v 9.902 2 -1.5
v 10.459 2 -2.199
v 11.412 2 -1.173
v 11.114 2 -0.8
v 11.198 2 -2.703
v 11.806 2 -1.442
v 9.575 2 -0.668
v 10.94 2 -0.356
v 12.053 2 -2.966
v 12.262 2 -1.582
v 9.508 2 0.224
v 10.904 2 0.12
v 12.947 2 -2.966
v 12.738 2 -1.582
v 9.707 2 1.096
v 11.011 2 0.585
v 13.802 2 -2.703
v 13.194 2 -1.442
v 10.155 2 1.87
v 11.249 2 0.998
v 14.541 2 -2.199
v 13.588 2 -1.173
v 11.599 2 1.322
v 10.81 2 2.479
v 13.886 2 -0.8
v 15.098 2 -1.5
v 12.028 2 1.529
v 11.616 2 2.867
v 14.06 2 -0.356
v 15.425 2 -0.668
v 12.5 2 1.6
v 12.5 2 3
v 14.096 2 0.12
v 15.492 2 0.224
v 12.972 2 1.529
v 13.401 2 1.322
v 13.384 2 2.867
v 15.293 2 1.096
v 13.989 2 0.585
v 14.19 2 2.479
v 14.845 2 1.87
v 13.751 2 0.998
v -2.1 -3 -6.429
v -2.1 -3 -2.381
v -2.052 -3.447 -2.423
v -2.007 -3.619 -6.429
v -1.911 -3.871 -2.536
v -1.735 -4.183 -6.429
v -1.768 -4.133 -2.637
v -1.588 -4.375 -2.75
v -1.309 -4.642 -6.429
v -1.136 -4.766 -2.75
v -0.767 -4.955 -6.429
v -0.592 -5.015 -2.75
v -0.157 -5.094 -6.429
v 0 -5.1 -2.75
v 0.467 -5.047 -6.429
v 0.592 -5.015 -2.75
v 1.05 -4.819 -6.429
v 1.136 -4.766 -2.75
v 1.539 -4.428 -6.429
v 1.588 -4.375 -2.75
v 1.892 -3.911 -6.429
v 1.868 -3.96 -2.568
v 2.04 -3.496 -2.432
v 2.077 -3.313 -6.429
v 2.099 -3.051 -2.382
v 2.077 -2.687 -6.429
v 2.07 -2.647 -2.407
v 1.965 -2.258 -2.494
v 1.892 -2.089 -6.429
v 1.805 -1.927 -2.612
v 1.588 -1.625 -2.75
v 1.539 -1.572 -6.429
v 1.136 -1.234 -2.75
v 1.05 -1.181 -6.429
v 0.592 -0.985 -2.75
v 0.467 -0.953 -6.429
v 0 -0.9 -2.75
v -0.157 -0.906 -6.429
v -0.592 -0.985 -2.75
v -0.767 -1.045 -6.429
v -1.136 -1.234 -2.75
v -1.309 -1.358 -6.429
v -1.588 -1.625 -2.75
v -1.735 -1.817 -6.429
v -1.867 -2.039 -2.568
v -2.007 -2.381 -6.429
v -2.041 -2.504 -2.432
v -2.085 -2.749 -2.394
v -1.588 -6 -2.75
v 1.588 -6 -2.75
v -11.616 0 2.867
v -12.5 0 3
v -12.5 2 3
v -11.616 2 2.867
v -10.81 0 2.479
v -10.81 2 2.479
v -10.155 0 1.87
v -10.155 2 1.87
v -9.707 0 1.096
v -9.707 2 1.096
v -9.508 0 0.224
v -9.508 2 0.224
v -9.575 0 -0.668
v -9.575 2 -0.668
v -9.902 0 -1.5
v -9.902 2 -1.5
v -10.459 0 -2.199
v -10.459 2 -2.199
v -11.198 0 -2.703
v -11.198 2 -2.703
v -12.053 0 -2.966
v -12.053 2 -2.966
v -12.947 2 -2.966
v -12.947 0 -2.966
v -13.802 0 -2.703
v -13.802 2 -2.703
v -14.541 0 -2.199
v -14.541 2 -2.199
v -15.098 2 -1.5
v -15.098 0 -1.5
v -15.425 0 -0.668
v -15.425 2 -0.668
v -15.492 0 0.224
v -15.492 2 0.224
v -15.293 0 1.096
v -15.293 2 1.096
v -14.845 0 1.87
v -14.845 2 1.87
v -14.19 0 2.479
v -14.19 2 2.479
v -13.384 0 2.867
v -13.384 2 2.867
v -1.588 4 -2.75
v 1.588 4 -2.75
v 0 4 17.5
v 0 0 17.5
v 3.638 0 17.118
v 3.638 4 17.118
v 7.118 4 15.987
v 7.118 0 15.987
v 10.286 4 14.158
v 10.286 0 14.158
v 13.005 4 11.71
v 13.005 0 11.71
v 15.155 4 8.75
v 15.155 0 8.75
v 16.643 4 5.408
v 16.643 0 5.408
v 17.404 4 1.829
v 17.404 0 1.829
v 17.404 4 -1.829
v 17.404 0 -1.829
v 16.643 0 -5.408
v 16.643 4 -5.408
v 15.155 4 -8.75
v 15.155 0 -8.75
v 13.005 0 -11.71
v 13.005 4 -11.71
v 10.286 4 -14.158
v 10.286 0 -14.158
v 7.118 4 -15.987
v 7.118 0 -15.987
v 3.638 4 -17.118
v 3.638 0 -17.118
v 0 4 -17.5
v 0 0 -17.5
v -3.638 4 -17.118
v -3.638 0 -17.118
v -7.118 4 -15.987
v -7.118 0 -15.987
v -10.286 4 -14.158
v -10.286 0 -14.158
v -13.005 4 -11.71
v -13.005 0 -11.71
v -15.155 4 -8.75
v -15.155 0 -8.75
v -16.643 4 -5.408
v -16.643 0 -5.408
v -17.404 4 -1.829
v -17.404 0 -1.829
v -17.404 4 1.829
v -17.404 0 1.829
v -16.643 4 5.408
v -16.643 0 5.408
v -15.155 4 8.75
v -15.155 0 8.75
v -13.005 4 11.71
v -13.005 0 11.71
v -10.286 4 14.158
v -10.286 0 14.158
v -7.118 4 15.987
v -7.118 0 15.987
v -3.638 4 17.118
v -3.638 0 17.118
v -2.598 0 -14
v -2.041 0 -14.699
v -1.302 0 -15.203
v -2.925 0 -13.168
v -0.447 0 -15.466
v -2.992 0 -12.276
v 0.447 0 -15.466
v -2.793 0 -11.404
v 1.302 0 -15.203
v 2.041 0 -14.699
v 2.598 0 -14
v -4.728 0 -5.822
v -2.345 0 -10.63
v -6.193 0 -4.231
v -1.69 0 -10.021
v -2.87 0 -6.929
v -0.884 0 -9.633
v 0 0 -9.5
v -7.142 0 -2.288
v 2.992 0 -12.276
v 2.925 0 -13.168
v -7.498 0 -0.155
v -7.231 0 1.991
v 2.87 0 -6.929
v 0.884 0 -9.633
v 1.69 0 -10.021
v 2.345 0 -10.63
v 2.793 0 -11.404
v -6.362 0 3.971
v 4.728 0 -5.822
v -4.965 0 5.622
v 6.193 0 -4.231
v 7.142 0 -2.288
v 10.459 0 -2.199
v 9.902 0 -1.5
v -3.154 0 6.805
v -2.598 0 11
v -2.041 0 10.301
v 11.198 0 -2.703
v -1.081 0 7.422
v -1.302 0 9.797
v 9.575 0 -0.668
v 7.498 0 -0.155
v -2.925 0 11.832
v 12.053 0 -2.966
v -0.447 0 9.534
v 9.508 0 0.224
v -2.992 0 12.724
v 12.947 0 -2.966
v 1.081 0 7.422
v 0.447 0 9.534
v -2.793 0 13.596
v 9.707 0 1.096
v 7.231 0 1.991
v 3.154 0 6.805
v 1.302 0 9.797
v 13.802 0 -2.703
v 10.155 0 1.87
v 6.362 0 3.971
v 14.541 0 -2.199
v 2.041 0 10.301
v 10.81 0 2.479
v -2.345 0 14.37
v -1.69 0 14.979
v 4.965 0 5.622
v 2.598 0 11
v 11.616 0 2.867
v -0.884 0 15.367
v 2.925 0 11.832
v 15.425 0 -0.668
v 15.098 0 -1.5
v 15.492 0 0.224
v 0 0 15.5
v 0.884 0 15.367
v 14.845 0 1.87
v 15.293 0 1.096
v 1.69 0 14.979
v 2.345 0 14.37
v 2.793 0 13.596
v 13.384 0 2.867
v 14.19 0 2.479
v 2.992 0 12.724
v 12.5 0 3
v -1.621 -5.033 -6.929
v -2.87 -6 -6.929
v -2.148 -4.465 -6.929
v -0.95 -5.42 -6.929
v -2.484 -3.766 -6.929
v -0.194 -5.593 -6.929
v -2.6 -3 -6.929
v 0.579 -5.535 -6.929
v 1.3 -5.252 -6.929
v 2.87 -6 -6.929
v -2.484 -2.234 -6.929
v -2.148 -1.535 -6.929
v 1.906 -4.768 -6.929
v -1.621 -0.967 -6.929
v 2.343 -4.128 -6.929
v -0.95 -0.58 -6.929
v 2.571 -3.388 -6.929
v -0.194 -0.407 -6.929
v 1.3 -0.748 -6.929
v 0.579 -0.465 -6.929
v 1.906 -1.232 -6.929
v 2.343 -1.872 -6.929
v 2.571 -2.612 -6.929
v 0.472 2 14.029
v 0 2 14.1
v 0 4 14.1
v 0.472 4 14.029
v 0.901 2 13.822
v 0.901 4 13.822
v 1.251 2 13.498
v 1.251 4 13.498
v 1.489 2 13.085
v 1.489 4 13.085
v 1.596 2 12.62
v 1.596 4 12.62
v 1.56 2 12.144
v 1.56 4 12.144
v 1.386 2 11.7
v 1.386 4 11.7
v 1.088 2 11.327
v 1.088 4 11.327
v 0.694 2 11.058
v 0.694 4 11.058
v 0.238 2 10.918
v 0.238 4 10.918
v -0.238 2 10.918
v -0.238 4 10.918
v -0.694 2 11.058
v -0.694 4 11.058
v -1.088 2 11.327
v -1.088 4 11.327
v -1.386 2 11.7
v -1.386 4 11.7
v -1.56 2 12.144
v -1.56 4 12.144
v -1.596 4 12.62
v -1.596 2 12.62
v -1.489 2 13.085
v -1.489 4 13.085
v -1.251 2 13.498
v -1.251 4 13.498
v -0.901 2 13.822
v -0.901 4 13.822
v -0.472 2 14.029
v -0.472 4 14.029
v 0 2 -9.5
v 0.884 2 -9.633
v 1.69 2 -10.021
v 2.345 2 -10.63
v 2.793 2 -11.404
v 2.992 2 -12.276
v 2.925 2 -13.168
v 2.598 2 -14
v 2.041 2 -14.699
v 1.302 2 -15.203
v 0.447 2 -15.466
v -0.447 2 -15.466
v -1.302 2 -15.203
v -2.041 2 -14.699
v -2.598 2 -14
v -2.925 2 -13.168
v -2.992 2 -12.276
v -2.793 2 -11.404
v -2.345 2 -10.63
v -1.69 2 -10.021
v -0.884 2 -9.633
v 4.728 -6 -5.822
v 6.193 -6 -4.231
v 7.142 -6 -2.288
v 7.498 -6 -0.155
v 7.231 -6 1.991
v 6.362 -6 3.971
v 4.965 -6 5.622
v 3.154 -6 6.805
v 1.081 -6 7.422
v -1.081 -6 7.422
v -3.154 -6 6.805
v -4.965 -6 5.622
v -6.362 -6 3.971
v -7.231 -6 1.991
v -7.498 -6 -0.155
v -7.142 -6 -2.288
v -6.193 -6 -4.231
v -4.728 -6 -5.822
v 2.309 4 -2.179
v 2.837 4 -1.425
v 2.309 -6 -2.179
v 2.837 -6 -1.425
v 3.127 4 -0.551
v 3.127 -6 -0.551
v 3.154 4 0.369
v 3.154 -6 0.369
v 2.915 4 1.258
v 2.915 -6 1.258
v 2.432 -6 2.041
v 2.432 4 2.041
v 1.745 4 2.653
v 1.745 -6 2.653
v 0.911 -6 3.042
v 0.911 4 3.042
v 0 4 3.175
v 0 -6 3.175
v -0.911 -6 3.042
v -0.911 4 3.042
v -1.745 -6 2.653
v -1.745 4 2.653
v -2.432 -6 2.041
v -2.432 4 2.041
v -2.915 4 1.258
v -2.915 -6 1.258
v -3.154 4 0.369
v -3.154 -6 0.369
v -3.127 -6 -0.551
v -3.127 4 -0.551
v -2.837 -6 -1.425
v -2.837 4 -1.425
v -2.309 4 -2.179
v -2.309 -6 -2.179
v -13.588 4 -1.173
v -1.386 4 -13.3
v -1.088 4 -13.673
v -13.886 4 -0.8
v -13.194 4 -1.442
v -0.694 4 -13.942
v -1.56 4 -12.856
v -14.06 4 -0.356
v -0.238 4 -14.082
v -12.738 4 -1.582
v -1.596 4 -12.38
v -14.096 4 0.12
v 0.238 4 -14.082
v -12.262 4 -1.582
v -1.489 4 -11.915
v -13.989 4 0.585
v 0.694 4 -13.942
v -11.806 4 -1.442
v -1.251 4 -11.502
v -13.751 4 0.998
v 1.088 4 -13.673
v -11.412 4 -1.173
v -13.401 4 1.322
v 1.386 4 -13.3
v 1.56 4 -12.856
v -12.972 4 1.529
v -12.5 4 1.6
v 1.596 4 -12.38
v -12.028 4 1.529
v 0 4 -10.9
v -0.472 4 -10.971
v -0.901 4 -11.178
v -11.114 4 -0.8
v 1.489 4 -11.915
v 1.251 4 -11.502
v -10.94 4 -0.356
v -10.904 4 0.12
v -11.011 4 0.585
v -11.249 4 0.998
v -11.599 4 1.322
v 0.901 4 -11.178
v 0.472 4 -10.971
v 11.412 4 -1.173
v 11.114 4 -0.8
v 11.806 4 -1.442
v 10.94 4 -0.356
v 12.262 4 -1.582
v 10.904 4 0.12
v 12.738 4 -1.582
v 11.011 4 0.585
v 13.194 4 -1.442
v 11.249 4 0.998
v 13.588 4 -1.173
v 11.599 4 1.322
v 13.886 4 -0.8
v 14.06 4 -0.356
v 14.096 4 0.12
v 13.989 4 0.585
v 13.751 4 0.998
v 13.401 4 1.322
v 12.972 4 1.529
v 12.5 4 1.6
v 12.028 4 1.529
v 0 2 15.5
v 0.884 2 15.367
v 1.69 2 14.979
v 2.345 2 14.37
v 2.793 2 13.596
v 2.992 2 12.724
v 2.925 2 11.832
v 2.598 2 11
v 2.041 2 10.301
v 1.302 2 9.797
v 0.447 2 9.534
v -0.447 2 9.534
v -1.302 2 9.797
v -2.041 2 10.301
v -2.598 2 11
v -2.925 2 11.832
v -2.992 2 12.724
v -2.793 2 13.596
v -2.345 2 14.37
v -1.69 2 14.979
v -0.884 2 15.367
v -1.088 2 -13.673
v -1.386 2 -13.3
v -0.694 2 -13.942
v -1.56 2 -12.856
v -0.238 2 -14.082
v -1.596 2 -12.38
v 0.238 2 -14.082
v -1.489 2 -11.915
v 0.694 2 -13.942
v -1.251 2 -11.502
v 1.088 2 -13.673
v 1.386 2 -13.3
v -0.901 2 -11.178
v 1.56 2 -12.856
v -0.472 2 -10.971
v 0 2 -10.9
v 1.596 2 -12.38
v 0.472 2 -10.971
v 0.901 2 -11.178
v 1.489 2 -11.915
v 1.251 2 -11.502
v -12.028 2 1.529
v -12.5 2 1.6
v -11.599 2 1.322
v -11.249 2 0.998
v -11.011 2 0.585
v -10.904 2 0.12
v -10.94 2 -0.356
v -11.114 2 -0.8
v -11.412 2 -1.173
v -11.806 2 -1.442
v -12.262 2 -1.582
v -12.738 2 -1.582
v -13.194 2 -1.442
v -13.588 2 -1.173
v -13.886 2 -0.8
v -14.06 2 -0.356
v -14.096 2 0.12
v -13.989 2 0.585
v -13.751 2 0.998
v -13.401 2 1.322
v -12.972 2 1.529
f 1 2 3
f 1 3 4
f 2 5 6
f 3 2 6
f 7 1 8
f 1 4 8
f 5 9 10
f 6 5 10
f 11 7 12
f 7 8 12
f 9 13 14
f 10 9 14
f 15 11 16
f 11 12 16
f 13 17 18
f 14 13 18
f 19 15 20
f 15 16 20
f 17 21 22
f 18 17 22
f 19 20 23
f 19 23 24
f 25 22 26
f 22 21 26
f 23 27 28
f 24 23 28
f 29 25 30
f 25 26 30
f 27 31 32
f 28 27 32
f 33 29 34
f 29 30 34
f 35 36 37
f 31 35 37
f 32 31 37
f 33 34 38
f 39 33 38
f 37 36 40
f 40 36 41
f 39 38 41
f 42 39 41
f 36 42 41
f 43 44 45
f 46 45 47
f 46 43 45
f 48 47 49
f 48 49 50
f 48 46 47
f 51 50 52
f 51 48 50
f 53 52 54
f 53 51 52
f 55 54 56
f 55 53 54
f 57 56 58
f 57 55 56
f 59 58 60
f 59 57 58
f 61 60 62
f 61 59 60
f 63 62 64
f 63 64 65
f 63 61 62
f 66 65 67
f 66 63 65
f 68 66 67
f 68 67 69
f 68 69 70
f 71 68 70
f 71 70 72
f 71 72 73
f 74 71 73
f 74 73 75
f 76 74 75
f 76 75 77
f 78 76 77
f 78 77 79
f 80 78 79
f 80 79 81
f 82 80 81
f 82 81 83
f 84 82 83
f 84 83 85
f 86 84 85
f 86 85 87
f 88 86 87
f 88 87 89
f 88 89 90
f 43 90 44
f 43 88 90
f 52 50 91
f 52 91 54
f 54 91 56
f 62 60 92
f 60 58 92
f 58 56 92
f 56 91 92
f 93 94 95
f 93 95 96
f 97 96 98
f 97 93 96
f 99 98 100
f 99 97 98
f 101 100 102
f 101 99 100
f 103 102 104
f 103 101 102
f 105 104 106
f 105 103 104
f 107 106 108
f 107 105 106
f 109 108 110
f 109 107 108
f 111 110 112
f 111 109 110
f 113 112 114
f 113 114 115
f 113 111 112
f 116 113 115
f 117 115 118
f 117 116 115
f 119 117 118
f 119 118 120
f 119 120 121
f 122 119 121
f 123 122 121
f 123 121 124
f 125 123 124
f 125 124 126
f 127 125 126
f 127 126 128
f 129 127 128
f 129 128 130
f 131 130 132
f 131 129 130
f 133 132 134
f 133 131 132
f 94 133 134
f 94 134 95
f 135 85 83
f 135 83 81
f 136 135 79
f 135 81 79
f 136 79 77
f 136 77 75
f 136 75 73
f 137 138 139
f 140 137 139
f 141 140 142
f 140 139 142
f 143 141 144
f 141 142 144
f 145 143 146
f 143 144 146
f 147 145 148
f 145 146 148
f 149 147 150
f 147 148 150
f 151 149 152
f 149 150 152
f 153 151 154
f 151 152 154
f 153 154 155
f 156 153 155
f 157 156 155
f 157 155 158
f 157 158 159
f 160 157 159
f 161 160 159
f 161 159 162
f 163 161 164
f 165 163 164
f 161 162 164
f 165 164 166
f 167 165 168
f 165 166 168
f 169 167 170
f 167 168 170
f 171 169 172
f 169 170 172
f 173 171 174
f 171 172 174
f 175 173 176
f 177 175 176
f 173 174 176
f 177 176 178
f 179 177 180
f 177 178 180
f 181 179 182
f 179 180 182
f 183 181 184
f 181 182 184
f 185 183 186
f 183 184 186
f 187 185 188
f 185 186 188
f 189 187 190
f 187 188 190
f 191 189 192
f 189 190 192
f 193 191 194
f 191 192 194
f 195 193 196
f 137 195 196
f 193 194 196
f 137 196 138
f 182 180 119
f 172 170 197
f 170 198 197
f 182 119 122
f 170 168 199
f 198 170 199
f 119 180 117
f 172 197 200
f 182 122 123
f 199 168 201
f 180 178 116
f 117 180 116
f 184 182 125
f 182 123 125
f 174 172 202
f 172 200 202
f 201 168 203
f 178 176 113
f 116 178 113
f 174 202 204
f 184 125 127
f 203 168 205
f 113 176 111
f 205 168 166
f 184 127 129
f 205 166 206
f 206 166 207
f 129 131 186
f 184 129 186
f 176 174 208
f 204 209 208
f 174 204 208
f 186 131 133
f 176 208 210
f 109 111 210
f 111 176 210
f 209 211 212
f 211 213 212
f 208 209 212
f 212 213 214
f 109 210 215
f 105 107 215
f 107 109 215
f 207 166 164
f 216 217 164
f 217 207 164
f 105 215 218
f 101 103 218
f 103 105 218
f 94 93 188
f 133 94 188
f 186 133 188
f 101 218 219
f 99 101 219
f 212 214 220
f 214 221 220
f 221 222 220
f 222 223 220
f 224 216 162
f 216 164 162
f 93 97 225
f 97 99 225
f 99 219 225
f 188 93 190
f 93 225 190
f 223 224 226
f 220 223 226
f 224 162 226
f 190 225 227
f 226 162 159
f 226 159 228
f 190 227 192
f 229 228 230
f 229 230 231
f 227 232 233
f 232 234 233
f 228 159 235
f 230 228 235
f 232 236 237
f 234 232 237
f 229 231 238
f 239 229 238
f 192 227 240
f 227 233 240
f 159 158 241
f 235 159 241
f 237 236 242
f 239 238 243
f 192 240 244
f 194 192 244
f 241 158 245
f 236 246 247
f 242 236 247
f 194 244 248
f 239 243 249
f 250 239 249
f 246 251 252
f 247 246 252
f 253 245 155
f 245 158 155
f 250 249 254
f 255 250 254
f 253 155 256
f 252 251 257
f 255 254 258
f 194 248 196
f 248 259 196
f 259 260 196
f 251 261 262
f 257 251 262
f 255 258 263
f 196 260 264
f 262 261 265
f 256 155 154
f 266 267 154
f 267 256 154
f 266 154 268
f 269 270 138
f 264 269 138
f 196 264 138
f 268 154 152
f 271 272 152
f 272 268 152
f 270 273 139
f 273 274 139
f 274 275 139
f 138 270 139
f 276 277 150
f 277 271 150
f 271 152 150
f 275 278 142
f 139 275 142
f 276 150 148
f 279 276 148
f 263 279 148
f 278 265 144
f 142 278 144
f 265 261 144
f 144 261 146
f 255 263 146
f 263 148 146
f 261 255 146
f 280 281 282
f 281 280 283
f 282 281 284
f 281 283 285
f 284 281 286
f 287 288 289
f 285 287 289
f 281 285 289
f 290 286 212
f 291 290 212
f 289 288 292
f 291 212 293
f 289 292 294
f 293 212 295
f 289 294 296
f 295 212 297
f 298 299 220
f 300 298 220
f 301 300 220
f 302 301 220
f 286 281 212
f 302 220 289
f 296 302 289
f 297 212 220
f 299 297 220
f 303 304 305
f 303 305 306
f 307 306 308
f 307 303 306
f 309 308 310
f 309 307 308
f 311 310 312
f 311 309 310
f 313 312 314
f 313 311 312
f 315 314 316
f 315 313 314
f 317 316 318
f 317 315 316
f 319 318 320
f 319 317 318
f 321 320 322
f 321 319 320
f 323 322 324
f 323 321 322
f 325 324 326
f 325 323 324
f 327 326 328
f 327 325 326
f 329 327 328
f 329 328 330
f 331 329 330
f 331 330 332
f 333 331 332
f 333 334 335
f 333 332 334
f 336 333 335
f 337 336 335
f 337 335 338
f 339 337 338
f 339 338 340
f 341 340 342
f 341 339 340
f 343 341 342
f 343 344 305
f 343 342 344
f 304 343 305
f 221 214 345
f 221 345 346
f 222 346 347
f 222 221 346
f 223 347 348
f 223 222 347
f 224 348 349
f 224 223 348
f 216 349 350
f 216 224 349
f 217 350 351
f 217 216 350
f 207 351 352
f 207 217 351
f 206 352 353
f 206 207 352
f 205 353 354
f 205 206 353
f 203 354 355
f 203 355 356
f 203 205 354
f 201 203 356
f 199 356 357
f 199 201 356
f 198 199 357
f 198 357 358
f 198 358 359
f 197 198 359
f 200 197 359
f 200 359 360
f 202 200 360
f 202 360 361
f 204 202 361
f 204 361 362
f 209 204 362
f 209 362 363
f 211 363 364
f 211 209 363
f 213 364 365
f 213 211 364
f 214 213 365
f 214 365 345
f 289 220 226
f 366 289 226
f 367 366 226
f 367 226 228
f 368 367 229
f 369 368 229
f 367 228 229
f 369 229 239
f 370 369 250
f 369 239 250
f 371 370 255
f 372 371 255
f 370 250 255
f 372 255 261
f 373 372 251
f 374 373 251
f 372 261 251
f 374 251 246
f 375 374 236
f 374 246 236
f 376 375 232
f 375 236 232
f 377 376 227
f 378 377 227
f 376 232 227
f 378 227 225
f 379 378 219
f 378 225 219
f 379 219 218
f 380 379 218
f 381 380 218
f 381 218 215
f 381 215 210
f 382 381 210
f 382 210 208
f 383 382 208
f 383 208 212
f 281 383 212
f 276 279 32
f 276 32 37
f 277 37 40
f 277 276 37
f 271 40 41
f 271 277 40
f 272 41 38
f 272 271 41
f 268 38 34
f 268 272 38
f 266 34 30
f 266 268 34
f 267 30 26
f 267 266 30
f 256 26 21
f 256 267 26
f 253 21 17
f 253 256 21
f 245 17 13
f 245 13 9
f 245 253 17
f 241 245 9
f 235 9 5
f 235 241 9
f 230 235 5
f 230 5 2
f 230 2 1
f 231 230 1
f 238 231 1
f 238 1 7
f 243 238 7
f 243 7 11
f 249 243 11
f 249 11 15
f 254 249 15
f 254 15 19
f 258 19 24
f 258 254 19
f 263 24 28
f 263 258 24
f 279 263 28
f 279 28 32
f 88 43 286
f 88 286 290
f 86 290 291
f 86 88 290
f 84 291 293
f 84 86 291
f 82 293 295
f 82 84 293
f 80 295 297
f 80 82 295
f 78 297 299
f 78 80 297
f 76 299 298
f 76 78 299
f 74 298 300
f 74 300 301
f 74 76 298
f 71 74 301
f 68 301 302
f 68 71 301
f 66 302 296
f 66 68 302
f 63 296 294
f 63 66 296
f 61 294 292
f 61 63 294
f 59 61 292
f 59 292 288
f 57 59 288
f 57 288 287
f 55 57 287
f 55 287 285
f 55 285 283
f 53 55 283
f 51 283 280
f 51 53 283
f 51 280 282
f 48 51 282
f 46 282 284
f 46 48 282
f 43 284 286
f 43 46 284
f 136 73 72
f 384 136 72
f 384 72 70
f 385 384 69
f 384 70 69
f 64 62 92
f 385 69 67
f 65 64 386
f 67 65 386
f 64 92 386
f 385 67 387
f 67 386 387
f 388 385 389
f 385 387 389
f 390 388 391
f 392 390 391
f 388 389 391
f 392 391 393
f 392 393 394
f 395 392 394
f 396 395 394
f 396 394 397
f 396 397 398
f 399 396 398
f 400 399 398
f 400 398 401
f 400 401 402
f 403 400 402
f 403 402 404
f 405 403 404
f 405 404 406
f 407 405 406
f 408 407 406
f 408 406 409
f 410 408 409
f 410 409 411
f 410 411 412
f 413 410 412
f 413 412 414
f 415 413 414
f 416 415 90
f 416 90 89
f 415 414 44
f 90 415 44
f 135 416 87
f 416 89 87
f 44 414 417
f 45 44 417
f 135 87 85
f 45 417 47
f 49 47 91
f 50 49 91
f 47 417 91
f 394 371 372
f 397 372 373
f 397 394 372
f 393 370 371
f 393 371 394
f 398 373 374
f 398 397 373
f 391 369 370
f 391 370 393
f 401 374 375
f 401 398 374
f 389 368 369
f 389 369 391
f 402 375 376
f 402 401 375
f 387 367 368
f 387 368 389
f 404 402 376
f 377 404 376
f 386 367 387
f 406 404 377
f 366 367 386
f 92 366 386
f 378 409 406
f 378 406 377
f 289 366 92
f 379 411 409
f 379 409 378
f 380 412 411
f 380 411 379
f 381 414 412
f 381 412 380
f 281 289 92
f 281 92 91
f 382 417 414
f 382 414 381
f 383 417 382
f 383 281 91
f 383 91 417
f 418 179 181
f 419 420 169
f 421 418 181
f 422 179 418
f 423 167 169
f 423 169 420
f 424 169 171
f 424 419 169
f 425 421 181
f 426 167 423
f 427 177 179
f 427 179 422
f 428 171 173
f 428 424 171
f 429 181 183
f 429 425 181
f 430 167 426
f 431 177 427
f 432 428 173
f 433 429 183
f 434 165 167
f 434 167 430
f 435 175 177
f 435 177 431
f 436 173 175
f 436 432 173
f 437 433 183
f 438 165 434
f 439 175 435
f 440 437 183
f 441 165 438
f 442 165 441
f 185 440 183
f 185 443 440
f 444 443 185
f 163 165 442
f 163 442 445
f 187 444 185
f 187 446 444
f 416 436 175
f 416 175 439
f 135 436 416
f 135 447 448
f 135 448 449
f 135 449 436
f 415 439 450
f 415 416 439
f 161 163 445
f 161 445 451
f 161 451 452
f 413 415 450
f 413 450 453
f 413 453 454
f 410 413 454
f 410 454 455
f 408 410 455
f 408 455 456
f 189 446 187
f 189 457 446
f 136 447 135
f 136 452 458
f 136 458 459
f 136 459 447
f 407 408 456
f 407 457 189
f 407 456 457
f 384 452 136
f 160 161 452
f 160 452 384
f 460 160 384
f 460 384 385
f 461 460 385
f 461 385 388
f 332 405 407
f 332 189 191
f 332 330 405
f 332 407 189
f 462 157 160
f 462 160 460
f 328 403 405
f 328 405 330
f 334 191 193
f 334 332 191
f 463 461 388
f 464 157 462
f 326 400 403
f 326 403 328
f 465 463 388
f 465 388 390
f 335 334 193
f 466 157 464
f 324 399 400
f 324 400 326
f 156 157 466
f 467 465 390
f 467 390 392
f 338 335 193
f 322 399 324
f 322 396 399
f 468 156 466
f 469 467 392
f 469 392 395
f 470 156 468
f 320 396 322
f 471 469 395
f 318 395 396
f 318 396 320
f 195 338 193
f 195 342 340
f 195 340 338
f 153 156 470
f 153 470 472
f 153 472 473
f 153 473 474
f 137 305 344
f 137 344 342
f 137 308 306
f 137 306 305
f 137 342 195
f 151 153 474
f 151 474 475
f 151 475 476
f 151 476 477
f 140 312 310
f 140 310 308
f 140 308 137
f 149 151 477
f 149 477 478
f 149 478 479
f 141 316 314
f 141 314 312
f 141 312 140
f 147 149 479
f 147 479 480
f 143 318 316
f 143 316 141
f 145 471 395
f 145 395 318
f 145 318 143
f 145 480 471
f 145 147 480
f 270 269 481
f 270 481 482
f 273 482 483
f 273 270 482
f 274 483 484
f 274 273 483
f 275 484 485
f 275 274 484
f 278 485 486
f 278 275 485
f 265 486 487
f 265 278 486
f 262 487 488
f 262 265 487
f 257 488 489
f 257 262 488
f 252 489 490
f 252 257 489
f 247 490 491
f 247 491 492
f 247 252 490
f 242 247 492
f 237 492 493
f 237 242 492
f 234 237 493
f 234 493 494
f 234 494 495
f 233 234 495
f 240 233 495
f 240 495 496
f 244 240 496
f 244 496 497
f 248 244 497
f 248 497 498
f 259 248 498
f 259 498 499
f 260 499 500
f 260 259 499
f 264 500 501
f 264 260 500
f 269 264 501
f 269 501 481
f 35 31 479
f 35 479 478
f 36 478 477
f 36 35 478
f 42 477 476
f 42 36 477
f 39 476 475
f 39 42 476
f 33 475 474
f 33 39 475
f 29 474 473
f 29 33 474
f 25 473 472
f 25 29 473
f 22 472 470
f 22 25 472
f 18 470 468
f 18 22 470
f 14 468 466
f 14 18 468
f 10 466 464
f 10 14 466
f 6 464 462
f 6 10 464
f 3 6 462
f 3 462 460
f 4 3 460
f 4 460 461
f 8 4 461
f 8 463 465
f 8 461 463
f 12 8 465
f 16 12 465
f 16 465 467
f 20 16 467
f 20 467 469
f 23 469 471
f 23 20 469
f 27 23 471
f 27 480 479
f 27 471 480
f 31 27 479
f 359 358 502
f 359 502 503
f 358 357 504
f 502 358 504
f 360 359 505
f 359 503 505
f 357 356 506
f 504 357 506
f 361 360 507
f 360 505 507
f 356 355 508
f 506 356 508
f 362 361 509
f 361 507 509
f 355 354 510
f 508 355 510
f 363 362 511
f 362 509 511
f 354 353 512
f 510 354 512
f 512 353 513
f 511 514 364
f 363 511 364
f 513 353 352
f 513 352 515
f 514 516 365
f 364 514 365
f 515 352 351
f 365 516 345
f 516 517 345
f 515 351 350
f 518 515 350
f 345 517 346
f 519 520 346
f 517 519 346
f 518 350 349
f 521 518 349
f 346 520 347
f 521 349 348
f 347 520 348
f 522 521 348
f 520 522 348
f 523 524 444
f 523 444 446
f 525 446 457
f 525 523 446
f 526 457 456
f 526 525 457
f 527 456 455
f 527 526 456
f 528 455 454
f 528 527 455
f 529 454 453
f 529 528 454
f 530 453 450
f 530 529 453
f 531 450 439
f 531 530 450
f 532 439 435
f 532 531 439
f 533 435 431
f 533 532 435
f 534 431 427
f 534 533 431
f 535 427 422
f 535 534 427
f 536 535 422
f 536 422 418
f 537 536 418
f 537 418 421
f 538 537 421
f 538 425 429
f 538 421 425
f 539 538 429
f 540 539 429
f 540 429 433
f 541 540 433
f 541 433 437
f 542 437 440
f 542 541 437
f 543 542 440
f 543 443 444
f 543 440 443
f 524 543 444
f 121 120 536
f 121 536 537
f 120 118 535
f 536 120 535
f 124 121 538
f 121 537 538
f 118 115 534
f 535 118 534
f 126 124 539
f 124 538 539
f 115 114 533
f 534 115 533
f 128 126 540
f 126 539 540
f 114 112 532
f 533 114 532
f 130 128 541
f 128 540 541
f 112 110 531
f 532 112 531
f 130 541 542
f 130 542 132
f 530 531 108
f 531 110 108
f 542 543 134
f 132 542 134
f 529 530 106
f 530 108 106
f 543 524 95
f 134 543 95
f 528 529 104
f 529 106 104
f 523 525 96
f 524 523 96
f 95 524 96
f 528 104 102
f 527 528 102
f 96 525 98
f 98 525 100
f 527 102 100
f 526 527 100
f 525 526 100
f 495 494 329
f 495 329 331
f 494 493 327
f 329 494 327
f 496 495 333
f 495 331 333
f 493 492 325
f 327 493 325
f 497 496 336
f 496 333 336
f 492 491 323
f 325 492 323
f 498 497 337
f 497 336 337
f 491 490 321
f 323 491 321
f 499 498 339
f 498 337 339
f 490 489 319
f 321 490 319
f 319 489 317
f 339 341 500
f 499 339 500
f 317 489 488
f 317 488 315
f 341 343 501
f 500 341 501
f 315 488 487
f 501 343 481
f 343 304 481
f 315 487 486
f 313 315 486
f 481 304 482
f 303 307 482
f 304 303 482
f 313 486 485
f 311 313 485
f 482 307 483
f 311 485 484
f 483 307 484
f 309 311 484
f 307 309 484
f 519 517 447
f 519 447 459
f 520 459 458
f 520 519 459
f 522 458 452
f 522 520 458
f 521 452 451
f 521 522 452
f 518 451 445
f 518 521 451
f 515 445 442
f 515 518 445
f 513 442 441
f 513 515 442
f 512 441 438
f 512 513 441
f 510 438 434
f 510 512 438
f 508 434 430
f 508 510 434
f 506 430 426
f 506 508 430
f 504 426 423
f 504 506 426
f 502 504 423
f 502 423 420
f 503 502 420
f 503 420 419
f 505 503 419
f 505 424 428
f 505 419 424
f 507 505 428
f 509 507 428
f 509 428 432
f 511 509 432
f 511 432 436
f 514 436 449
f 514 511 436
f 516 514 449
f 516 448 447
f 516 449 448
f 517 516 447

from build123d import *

# Parameters (mm, degrees)
SKETCH1_R               = 17.5
BOSS_EXTRUDE1_DEPTH     = 4
BOSS_EXTRUDE2_DEPTH     = 6
CUT_EXTRUDE1_DEPTH      = 26.465663156
CUT_EXTRUDE1_DEPTH_BACK = 26.465663156
SKETCH3_R               = 1.6
CUT_EXTRUDE2_DEPTH      = 1
CUT_EXTRUDE2_DEPTH_BACK = 23.716032156
CUT_EXTRUDE2_START      = -2.749631
SKETCH5_R               = 2.1
CHAMFER1_SIZE           = 0.5
SKETCH6_R               = 3
CUT_EXTRUDE3_DEPTH      = 2


with BuildPart() as part:
    # Sketch1 → Boss-Extrude1 (new body)
    with BuildSketch(Plane(origin=(0, 0, 0), x_dir=(1, 0, 0), z_dir=(0, 1, 0))):
        with Locations(Location((0, 0, 0), (0, 0, 270))):
            Circle(SKETCH1_R)
    extrude(amount=BOSS_EXTRUDE1_DEPTH)

    # Sketch2 → Boss-Extrude2 (add)
    with BuildSketch(Plane(origin=(0, 0, 0), x_dir=(1, 0, 0), z_dir=(0, 1, 0))):
        with BuildLine():
            Line((-2.87, 6.929148577), (2.87, 6.929148577))
            ThreePointArc((2.87, 6.929148577), (0, -7.5), (-2.87, 6.929148577))
        make_face()
    extrude(amount=-BOSS_EXTRUDE2_DEPTH)

    # Sketch3 → Cut-Extrude1 (cut, two sides: drawn at the far end of the back side and taken through both)
    with BuildSketch(Plane(origin=(0, 0, 0), x_dir=(1, 0, 0), z_dir=(0, 1, 0)).offset(-CUT_EXTRUDE1_DEPTH_BACK)):
        with Locations(Location((0, 12.5, 0), (0, 0, 270))):
            Circle(SKETCH3_R)
        with Locations(Location((12.5, 0, 0), (0, 0, 270))):
            Circle(SKETCH3_R)
        with Locations(Location((0, -12.5, 0), (0, 0, 270))):
            Circle(SKETCH3_R)
        with Locations(Location((-12.5, 0, 0), (0, 0, 270))):
            Circle(SKETCH3_R)
        with BuildLine():
            Line((-1.5875, 2.749630657), (1.5875, 2.749630657))
            ThreePointArc((1.5875, 2.749630657), (0, -3.175), (-1.5875, 2.749630657))
        make_face()
    extrude(amount=CUT_EXTRUDE1_DEPTH + CUT_EXTRUDE1_DEPTH_BACK, mode=Mode.SUBTRACT)

    # Sketch5 → Cut-Extrude2 (cut, two sides: drawn at the far end of the back side and taken through both)
    with BuildSketch(Plane.XY.offset(CUT_EXTRUDE2_START - CUT_EXTRUDE2_DEPTH_BACK)):
        with Locations(Location((0, -3, 0), (0, 0, 180))):
            Circle(SKETCH5_R)
    extrude(amount=CUT_EXTRUDE2_DEPTH + CUT_EXTRUDE2_DEPTH_BACK, mode=Mode.SUBTRACT)

    # Chamfer1
    chamfer1_edges = [part.edges().sort_by_distance(p)[0] for p in [
        (2.1, -3, -6.929148577),
    ]]
    chamfer(chamfer1_edges, length=CHAMFER1_SIZE)

    # Sketch6 → Cut-Extrude3 (cut)
    with BuildSketch(Plane(origin=(0, 0, 0), x_dir=(1, 0, 0), z_dir=(0, 1, 0))):
        with Locations(Location((0, 12.5, 0), (0, 0, 270))):
            Circle(SKETCH6_R)
        with Locations(Location((12.5, 0, 0), (0, 0, 270))):
            Circle(SKETCH6_R)
        with Locations(Location((0, -12.5, 0), (0, 0, 270))):
            Circle(SKETCH6_R)
        with Locations(Location((-12.5, 0, 0), (0, 0, 270))):
            Circle(SKETCH6_R)
    extrude(amount=CUT_EXTRUDE3_DEPTH, mode=Mode.SUBTRACT)


solid = part.part
